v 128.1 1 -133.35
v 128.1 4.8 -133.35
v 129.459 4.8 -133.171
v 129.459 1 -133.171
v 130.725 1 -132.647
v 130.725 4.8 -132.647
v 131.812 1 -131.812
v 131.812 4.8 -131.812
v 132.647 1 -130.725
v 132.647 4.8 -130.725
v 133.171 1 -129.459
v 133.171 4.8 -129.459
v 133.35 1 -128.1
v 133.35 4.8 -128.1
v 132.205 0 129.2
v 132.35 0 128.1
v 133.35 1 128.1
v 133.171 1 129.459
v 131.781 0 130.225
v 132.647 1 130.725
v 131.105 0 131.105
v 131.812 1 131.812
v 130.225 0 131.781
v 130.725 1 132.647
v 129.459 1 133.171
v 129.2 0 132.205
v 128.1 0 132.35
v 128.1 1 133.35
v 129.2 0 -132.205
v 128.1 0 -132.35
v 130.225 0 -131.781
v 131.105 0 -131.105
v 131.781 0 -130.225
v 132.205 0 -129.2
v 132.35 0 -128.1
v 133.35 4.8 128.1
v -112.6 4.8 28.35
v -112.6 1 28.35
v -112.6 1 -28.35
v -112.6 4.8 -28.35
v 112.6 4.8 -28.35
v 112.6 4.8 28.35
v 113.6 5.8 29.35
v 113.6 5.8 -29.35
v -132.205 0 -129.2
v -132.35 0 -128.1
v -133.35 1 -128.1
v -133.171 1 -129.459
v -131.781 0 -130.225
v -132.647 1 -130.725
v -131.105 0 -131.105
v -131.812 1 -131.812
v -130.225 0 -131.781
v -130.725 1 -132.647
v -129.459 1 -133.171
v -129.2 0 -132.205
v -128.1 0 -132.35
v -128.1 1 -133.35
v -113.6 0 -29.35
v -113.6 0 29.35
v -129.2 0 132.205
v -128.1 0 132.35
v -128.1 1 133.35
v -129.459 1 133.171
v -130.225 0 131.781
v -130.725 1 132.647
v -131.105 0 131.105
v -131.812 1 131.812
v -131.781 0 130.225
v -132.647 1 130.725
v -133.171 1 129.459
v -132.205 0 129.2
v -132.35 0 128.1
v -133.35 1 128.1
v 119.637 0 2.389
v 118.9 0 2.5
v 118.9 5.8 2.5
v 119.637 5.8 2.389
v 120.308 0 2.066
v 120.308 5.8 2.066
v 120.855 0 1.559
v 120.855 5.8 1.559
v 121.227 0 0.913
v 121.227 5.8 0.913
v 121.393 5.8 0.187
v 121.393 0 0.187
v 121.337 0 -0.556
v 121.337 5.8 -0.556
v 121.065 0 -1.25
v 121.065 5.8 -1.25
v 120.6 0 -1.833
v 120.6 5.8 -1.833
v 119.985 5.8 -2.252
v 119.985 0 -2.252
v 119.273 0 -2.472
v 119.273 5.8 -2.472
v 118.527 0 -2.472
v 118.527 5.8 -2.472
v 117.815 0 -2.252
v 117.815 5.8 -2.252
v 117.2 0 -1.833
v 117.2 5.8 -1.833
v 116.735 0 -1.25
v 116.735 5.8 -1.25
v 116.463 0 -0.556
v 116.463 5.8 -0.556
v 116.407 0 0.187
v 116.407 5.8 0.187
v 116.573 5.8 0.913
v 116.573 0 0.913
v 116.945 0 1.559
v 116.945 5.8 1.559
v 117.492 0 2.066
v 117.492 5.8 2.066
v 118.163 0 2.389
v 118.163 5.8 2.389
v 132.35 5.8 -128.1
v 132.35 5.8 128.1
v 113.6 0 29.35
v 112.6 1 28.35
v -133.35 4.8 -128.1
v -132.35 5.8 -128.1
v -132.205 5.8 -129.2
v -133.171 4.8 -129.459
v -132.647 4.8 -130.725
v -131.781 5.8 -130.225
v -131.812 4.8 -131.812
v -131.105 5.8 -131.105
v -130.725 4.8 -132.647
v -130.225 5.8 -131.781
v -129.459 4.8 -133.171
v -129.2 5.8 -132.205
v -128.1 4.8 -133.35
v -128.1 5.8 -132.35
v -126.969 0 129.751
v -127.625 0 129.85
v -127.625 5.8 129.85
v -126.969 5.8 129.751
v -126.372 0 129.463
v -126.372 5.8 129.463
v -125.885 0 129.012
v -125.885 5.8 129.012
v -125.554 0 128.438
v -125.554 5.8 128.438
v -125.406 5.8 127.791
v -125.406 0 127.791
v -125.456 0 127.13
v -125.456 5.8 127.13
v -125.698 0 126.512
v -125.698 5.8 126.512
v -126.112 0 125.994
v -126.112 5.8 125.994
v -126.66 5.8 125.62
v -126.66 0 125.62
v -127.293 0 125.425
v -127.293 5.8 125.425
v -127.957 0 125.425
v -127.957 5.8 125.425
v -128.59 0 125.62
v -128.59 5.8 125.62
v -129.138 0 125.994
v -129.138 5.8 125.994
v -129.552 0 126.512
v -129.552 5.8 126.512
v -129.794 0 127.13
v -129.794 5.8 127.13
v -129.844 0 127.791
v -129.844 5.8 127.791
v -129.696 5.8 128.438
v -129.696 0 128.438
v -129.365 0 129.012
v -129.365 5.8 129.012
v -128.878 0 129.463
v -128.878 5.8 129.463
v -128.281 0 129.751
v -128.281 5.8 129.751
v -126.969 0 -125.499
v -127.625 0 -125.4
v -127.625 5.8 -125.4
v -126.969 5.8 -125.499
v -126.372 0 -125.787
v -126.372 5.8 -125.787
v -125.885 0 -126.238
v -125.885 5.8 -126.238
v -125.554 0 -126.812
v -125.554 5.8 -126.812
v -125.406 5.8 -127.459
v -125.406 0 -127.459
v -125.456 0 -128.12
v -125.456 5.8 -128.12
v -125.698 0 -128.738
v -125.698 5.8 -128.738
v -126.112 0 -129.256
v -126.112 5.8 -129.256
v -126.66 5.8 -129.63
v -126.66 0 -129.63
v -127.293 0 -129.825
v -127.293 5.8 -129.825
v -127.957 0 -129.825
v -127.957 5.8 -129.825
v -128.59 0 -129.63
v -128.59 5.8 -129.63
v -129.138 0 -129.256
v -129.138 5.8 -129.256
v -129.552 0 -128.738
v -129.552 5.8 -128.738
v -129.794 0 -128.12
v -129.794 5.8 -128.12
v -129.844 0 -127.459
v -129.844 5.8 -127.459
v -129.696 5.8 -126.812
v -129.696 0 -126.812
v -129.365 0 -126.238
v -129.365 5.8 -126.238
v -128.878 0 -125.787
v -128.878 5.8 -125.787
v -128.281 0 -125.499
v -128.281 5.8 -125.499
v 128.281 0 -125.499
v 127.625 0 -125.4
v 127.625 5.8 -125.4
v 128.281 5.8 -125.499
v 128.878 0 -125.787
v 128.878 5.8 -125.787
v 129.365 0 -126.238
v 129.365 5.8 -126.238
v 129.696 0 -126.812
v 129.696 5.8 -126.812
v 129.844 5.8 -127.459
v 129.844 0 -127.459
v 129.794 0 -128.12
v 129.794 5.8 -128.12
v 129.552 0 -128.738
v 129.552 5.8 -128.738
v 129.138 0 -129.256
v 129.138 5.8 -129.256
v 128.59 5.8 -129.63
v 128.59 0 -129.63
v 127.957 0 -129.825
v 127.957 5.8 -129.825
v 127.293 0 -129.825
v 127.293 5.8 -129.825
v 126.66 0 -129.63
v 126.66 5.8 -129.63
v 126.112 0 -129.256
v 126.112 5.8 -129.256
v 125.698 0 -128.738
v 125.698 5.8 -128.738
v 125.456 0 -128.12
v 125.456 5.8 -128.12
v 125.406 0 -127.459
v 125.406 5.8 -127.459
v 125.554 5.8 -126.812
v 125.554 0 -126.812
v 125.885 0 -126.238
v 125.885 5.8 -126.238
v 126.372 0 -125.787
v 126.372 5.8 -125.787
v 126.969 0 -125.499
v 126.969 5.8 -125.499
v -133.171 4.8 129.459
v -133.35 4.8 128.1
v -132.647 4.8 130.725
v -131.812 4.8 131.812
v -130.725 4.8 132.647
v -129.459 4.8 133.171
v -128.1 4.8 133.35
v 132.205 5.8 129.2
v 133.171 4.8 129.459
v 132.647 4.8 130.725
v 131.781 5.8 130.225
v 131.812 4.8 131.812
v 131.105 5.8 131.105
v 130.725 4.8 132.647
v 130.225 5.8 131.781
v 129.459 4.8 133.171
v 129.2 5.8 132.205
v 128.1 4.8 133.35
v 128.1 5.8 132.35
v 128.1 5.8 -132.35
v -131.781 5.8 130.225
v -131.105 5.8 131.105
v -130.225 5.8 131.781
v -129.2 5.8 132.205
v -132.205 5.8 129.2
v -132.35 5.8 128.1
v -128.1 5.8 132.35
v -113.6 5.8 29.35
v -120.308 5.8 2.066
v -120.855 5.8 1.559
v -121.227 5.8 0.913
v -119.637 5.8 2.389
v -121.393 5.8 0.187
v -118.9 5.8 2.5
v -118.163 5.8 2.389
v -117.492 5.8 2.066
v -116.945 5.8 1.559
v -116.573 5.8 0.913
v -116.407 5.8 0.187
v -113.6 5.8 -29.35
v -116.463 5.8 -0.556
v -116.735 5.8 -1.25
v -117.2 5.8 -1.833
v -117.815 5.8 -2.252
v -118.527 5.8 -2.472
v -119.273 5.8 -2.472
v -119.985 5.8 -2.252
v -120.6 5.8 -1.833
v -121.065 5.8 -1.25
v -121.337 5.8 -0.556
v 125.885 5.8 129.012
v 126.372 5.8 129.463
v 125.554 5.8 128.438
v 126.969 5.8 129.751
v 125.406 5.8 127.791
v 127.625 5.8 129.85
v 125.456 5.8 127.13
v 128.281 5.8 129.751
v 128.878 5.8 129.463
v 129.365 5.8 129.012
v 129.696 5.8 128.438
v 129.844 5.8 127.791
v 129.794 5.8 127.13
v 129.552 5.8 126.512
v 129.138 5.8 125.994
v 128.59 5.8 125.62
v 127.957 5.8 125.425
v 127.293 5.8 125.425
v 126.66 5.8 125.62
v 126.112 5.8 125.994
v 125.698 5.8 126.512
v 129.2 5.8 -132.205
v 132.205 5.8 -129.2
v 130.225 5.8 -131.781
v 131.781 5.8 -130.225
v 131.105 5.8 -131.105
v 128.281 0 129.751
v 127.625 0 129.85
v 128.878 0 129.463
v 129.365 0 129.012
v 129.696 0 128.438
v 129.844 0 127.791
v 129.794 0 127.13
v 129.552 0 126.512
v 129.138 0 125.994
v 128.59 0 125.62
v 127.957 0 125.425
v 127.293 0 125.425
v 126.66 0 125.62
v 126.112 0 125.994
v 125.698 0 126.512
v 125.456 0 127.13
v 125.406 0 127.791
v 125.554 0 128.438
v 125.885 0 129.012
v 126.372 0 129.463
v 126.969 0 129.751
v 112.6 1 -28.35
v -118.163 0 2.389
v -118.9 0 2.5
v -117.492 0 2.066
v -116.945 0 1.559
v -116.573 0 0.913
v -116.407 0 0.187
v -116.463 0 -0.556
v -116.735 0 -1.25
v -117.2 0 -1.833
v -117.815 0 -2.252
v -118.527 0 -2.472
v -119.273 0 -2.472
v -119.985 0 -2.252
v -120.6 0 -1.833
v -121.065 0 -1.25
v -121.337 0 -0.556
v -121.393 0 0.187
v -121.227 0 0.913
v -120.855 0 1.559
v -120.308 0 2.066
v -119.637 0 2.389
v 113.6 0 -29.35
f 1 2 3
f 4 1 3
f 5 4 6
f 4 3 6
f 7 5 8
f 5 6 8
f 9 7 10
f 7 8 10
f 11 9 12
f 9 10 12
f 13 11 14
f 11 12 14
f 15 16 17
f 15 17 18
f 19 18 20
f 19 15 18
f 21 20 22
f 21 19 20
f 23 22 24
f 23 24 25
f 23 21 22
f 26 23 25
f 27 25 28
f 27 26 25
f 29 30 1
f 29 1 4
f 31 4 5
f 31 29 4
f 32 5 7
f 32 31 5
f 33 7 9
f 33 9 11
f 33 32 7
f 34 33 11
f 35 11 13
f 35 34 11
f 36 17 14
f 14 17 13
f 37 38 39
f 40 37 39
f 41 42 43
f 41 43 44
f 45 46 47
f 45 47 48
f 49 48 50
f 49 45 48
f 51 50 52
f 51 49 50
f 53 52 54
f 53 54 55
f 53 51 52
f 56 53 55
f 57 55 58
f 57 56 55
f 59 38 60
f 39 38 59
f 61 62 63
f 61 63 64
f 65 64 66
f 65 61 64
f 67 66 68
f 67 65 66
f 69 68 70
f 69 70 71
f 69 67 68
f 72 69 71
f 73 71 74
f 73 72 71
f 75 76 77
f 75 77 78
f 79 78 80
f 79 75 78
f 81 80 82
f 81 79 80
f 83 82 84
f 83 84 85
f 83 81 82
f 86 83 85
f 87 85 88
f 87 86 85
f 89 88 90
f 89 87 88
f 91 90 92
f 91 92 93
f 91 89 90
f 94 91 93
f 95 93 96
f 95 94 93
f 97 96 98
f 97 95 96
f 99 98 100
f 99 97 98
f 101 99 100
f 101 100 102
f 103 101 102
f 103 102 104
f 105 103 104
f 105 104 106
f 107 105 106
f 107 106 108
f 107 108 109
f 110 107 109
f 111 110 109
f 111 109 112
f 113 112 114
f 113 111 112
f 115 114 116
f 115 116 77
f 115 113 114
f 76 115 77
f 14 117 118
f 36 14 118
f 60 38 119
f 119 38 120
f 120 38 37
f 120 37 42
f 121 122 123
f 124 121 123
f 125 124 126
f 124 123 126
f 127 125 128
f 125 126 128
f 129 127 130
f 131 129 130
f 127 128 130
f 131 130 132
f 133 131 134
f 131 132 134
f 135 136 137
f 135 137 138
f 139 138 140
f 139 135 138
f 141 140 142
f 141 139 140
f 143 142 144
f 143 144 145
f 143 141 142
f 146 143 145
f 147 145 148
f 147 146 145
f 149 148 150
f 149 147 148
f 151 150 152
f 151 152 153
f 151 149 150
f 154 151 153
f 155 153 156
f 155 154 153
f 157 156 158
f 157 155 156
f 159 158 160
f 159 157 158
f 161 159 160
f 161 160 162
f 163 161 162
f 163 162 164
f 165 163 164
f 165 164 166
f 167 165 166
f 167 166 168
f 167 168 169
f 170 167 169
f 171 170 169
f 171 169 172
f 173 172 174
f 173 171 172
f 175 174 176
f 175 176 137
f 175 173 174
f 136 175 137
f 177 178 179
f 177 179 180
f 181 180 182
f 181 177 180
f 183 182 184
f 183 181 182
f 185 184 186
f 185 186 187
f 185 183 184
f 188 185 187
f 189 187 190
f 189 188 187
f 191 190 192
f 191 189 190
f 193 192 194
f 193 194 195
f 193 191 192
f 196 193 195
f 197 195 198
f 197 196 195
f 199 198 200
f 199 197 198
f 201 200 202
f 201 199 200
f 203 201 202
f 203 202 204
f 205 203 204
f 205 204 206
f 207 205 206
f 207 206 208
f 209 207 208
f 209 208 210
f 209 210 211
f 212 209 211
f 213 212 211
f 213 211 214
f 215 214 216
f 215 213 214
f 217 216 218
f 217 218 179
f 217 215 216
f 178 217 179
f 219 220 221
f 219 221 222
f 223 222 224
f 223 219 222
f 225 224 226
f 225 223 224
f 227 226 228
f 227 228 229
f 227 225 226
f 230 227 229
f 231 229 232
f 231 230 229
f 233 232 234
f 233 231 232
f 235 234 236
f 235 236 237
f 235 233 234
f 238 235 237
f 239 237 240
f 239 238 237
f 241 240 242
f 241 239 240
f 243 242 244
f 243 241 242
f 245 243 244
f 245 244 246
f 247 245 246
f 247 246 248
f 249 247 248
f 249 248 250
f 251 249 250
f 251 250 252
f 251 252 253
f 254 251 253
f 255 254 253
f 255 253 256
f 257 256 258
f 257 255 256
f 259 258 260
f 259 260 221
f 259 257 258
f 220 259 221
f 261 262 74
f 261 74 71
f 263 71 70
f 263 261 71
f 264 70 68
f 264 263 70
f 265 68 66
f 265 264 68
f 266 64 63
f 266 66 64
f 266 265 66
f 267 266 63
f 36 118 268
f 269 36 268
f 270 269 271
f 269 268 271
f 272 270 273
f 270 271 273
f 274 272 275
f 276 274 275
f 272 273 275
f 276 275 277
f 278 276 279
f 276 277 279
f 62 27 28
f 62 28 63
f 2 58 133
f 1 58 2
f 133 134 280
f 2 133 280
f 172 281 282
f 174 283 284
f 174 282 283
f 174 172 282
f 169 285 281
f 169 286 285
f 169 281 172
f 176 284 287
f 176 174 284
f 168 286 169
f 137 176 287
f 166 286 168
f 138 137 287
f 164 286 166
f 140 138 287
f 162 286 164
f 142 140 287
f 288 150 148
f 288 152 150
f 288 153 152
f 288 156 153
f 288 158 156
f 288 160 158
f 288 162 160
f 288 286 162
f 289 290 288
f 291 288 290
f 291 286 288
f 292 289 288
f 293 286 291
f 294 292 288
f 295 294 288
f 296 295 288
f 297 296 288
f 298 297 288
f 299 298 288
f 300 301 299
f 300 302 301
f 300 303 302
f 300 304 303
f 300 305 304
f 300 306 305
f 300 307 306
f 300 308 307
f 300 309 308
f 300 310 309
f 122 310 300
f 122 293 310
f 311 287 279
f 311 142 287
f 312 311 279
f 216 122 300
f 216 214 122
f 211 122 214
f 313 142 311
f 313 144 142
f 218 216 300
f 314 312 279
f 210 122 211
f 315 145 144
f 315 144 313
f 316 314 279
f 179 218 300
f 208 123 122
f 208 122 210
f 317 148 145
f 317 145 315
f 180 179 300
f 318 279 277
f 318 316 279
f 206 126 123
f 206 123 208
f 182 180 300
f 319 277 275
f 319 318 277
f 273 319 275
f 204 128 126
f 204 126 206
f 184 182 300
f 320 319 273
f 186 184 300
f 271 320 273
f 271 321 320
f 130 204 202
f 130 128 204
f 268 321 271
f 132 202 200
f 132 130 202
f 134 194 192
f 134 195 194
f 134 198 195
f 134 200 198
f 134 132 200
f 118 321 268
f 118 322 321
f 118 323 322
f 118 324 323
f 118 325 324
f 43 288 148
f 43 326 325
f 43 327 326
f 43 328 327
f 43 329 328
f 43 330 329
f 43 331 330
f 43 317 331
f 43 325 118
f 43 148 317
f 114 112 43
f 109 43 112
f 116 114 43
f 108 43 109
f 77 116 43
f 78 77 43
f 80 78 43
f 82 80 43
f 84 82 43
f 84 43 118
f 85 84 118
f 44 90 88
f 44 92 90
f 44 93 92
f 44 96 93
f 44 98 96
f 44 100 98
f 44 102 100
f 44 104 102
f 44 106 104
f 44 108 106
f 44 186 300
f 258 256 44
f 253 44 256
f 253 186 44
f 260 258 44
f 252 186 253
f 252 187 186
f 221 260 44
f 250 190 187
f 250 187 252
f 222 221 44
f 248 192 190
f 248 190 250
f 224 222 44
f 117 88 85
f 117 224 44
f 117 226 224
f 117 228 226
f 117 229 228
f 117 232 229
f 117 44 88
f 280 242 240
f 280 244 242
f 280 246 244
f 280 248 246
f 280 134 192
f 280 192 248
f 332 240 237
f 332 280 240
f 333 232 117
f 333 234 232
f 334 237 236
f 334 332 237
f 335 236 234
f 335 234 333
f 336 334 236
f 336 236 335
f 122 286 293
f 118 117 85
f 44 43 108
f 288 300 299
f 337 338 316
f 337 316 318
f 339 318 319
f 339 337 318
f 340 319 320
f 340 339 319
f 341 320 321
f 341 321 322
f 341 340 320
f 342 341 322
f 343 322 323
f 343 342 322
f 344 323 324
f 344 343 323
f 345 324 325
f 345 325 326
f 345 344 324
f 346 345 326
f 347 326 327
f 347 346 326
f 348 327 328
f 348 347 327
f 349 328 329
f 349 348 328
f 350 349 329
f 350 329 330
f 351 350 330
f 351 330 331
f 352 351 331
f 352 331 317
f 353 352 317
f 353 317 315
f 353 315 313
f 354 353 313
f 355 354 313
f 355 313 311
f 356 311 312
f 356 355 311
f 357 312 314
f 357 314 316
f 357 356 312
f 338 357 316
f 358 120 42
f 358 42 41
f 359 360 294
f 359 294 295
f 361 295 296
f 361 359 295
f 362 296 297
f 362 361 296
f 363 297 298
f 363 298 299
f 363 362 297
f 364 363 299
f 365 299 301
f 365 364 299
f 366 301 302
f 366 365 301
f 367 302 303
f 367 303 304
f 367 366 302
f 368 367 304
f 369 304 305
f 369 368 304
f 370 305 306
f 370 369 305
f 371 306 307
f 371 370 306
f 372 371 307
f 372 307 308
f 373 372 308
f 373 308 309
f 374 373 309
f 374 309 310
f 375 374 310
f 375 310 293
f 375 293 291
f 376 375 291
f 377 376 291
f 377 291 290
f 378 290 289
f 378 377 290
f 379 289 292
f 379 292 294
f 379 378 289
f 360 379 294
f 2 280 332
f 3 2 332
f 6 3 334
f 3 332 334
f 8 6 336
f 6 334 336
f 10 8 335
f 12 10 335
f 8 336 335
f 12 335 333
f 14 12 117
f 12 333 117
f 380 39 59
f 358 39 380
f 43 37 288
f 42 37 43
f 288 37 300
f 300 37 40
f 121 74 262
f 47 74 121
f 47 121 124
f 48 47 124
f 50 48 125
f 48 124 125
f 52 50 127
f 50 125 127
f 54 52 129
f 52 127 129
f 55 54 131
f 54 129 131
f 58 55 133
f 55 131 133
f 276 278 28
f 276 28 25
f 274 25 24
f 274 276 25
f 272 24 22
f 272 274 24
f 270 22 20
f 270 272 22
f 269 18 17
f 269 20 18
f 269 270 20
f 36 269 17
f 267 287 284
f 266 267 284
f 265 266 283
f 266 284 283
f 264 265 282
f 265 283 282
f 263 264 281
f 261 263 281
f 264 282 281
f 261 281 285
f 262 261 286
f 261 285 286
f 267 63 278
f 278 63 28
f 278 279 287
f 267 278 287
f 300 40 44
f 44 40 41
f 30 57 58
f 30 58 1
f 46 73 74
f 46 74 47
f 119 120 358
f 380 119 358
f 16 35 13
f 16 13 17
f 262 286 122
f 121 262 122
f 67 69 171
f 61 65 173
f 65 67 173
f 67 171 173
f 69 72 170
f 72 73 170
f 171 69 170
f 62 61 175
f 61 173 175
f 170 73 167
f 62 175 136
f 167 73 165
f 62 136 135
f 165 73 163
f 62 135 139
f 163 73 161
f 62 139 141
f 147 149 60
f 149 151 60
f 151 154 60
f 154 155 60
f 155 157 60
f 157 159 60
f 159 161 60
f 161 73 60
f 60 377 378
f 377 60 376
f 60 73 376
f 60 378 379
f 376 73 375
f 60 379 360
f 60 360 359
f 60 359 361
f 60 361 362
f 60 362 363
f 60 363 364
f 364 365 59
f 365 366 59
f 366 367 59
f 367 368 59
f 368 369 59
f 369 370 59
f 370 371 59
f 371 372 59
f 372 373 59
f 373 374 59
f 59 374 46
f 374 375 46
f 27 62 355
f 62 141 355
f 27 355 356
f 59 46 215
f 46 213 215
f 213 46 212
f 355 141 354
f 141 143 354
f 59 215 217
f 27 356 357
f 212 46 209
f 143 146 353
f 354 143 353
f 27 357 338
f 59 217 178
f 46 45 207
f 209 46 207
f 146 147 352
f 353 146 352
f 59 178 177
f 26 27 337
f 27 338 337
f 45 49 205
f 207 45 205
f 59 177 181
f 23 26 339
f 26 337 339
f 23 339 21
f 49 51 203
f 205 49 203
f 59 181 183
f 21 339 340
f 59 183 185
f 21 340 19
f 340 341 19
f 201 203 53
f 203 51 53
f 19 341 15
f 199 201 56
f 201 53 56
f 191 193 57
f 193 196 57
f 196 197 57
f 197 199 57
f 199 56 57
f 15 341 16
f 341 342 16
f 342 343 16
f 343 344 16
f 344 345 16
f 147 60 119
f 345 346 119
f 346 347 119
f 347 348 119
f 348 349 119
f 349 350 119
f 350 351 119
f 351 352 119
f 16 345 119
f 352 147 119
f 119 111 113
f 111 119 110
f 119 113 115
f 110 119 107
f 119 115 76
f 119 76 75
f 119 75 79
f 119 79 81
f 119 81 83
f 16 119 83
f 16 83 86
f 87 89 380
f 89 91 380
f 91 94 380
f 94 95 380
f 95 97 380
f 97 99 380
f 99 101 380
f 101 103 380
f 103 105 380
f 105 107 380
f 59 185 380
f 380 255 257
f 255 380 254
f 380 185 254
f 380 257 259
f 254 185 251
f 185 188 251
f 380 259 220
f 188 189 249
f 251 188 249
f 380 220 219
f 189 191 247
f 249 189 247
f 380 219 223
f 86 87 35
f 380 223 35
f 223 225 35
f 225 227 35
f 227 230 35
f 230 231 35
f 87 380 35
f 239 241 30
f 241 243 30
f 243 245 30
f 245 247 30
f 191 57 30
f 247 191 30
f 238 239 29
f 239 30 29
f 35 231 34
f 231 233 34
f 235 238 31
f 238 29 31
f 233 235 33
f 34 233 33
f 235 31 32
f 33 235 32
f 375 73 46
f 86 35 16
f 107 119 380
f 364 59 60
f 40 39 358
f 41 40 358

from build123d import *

# Parameters (mm, degrees)
SKETCH1_W           = 266.7
SKETCH1_H           = 266.7
SKETCH1_R           = 2.225
SKETCH1_R_2         = 2.5
SKETCH1_W_2         = 225.2
SKETCH1_H_2         = 56.7
BOSS_EXTRUDE1_DEPTH = 5.8
FILLET1_R           = 5.25
CHAMFER1_SIZE       = 1


with BuildPart() as part:
    # Sketch1 → Boss-Extrude1 (new body)
    with BuildSketch(Plane(origin=(0, 0, 0), x_dir=(1, 0, 0), z_dir=(0, 1, 0))):
        Rectangle(SKETCH1_W, SKETCH1_H)
        with Locations(Location((-127.625, 127.625, 0), (0, 0, 270))):
            Circle(SKETCH1_R, mode=Mode.SUBTRACT)
        with Locations(Location((127.625, 127.625, 0), (0, 0, 270))):
            Circle(SKETCH1_R, mode=Mode.SUBTRACT)
        with Locations(Location((127.625, -127.625, 0), (0, 0, 270))):
            Circle(SKETCH1_R, mode=Mode.SUBTRACT)
        with Locations(Location((-127.625, -127.625, 0), (0, 0, 270))):
            Circle(SKETCH1_R, mode=Mode.SUBTRACT)
        with Locations(Location((118.9, 0, 0), (0, 0, 270))):
            Circle(SKETCH1_R_2, mode=Mode.SUBTRACT)
        with Locations(Location((-118.9, 0, 0), (0, 0, 270))):
            Circle(SKETCH1_R_2, mode=Mode.SUBTRACT)
        Rectangle(SKETCH1_W_2, SKETCH1_H_2, mode=Mode.SUBTRACT)
    extrude(amount=BOSS_EXTRUDE1_DEPTH)

    # Fillet1
    fillet1_edges = [part.edges().sort_by_distance(p)[0] for p in [
        (133.35, 2.9, 133.35),
        (-133.35, 2.9, 133.35),
        (-133.35, 2.9, -133.35),
        (133.35, 2.9, -133.35),
    ]]
    fillet(fillet1_edges, radius=FILLET1_R)

    # Chamfer1
    chamfer1_edges = [part.edges().sort_by_distance(p)[0] for p in [
        (112.6, 0, 0),
        (0, 0, -28.35),
        (-112.6, 0, 0),
        (0, 0, 28.35),
        (112.6, 5.8, 0),
        (0, 5.8, -28.35),
        (-112.6, 5.8, 0),
        (0, 5.8, 28.35),
        (-133.35, 0, 0),
        (-133.35, 5.8, 0),
        (133.35, 0, 0),
        (0, 0, 133.35),
        (0, 0, -133.35),
        (-131.812310601, 0, 131.812310601),
        (131.812310601, 0, 131.812310601),
        (131.812310601, 0, -131.812310601),
        (-131.812310601, 0, -131.812310601),
        (0, 5.8, -133.35),
        (133.35, 5.8, 0),
        (0, 5.8, 133.35),
        (-131.812310601, 5.8, 131.812310601),
        (131.812310601, 5.8, 131.812310601),
        (131.812310601, 5.8, -131.812310601),
        (-131.812310601, 5.8, -131.812310601),
    ]]
    chamfer(chamfer1_edges, length=CHAMFER1_SIZE)


solid = part.part
